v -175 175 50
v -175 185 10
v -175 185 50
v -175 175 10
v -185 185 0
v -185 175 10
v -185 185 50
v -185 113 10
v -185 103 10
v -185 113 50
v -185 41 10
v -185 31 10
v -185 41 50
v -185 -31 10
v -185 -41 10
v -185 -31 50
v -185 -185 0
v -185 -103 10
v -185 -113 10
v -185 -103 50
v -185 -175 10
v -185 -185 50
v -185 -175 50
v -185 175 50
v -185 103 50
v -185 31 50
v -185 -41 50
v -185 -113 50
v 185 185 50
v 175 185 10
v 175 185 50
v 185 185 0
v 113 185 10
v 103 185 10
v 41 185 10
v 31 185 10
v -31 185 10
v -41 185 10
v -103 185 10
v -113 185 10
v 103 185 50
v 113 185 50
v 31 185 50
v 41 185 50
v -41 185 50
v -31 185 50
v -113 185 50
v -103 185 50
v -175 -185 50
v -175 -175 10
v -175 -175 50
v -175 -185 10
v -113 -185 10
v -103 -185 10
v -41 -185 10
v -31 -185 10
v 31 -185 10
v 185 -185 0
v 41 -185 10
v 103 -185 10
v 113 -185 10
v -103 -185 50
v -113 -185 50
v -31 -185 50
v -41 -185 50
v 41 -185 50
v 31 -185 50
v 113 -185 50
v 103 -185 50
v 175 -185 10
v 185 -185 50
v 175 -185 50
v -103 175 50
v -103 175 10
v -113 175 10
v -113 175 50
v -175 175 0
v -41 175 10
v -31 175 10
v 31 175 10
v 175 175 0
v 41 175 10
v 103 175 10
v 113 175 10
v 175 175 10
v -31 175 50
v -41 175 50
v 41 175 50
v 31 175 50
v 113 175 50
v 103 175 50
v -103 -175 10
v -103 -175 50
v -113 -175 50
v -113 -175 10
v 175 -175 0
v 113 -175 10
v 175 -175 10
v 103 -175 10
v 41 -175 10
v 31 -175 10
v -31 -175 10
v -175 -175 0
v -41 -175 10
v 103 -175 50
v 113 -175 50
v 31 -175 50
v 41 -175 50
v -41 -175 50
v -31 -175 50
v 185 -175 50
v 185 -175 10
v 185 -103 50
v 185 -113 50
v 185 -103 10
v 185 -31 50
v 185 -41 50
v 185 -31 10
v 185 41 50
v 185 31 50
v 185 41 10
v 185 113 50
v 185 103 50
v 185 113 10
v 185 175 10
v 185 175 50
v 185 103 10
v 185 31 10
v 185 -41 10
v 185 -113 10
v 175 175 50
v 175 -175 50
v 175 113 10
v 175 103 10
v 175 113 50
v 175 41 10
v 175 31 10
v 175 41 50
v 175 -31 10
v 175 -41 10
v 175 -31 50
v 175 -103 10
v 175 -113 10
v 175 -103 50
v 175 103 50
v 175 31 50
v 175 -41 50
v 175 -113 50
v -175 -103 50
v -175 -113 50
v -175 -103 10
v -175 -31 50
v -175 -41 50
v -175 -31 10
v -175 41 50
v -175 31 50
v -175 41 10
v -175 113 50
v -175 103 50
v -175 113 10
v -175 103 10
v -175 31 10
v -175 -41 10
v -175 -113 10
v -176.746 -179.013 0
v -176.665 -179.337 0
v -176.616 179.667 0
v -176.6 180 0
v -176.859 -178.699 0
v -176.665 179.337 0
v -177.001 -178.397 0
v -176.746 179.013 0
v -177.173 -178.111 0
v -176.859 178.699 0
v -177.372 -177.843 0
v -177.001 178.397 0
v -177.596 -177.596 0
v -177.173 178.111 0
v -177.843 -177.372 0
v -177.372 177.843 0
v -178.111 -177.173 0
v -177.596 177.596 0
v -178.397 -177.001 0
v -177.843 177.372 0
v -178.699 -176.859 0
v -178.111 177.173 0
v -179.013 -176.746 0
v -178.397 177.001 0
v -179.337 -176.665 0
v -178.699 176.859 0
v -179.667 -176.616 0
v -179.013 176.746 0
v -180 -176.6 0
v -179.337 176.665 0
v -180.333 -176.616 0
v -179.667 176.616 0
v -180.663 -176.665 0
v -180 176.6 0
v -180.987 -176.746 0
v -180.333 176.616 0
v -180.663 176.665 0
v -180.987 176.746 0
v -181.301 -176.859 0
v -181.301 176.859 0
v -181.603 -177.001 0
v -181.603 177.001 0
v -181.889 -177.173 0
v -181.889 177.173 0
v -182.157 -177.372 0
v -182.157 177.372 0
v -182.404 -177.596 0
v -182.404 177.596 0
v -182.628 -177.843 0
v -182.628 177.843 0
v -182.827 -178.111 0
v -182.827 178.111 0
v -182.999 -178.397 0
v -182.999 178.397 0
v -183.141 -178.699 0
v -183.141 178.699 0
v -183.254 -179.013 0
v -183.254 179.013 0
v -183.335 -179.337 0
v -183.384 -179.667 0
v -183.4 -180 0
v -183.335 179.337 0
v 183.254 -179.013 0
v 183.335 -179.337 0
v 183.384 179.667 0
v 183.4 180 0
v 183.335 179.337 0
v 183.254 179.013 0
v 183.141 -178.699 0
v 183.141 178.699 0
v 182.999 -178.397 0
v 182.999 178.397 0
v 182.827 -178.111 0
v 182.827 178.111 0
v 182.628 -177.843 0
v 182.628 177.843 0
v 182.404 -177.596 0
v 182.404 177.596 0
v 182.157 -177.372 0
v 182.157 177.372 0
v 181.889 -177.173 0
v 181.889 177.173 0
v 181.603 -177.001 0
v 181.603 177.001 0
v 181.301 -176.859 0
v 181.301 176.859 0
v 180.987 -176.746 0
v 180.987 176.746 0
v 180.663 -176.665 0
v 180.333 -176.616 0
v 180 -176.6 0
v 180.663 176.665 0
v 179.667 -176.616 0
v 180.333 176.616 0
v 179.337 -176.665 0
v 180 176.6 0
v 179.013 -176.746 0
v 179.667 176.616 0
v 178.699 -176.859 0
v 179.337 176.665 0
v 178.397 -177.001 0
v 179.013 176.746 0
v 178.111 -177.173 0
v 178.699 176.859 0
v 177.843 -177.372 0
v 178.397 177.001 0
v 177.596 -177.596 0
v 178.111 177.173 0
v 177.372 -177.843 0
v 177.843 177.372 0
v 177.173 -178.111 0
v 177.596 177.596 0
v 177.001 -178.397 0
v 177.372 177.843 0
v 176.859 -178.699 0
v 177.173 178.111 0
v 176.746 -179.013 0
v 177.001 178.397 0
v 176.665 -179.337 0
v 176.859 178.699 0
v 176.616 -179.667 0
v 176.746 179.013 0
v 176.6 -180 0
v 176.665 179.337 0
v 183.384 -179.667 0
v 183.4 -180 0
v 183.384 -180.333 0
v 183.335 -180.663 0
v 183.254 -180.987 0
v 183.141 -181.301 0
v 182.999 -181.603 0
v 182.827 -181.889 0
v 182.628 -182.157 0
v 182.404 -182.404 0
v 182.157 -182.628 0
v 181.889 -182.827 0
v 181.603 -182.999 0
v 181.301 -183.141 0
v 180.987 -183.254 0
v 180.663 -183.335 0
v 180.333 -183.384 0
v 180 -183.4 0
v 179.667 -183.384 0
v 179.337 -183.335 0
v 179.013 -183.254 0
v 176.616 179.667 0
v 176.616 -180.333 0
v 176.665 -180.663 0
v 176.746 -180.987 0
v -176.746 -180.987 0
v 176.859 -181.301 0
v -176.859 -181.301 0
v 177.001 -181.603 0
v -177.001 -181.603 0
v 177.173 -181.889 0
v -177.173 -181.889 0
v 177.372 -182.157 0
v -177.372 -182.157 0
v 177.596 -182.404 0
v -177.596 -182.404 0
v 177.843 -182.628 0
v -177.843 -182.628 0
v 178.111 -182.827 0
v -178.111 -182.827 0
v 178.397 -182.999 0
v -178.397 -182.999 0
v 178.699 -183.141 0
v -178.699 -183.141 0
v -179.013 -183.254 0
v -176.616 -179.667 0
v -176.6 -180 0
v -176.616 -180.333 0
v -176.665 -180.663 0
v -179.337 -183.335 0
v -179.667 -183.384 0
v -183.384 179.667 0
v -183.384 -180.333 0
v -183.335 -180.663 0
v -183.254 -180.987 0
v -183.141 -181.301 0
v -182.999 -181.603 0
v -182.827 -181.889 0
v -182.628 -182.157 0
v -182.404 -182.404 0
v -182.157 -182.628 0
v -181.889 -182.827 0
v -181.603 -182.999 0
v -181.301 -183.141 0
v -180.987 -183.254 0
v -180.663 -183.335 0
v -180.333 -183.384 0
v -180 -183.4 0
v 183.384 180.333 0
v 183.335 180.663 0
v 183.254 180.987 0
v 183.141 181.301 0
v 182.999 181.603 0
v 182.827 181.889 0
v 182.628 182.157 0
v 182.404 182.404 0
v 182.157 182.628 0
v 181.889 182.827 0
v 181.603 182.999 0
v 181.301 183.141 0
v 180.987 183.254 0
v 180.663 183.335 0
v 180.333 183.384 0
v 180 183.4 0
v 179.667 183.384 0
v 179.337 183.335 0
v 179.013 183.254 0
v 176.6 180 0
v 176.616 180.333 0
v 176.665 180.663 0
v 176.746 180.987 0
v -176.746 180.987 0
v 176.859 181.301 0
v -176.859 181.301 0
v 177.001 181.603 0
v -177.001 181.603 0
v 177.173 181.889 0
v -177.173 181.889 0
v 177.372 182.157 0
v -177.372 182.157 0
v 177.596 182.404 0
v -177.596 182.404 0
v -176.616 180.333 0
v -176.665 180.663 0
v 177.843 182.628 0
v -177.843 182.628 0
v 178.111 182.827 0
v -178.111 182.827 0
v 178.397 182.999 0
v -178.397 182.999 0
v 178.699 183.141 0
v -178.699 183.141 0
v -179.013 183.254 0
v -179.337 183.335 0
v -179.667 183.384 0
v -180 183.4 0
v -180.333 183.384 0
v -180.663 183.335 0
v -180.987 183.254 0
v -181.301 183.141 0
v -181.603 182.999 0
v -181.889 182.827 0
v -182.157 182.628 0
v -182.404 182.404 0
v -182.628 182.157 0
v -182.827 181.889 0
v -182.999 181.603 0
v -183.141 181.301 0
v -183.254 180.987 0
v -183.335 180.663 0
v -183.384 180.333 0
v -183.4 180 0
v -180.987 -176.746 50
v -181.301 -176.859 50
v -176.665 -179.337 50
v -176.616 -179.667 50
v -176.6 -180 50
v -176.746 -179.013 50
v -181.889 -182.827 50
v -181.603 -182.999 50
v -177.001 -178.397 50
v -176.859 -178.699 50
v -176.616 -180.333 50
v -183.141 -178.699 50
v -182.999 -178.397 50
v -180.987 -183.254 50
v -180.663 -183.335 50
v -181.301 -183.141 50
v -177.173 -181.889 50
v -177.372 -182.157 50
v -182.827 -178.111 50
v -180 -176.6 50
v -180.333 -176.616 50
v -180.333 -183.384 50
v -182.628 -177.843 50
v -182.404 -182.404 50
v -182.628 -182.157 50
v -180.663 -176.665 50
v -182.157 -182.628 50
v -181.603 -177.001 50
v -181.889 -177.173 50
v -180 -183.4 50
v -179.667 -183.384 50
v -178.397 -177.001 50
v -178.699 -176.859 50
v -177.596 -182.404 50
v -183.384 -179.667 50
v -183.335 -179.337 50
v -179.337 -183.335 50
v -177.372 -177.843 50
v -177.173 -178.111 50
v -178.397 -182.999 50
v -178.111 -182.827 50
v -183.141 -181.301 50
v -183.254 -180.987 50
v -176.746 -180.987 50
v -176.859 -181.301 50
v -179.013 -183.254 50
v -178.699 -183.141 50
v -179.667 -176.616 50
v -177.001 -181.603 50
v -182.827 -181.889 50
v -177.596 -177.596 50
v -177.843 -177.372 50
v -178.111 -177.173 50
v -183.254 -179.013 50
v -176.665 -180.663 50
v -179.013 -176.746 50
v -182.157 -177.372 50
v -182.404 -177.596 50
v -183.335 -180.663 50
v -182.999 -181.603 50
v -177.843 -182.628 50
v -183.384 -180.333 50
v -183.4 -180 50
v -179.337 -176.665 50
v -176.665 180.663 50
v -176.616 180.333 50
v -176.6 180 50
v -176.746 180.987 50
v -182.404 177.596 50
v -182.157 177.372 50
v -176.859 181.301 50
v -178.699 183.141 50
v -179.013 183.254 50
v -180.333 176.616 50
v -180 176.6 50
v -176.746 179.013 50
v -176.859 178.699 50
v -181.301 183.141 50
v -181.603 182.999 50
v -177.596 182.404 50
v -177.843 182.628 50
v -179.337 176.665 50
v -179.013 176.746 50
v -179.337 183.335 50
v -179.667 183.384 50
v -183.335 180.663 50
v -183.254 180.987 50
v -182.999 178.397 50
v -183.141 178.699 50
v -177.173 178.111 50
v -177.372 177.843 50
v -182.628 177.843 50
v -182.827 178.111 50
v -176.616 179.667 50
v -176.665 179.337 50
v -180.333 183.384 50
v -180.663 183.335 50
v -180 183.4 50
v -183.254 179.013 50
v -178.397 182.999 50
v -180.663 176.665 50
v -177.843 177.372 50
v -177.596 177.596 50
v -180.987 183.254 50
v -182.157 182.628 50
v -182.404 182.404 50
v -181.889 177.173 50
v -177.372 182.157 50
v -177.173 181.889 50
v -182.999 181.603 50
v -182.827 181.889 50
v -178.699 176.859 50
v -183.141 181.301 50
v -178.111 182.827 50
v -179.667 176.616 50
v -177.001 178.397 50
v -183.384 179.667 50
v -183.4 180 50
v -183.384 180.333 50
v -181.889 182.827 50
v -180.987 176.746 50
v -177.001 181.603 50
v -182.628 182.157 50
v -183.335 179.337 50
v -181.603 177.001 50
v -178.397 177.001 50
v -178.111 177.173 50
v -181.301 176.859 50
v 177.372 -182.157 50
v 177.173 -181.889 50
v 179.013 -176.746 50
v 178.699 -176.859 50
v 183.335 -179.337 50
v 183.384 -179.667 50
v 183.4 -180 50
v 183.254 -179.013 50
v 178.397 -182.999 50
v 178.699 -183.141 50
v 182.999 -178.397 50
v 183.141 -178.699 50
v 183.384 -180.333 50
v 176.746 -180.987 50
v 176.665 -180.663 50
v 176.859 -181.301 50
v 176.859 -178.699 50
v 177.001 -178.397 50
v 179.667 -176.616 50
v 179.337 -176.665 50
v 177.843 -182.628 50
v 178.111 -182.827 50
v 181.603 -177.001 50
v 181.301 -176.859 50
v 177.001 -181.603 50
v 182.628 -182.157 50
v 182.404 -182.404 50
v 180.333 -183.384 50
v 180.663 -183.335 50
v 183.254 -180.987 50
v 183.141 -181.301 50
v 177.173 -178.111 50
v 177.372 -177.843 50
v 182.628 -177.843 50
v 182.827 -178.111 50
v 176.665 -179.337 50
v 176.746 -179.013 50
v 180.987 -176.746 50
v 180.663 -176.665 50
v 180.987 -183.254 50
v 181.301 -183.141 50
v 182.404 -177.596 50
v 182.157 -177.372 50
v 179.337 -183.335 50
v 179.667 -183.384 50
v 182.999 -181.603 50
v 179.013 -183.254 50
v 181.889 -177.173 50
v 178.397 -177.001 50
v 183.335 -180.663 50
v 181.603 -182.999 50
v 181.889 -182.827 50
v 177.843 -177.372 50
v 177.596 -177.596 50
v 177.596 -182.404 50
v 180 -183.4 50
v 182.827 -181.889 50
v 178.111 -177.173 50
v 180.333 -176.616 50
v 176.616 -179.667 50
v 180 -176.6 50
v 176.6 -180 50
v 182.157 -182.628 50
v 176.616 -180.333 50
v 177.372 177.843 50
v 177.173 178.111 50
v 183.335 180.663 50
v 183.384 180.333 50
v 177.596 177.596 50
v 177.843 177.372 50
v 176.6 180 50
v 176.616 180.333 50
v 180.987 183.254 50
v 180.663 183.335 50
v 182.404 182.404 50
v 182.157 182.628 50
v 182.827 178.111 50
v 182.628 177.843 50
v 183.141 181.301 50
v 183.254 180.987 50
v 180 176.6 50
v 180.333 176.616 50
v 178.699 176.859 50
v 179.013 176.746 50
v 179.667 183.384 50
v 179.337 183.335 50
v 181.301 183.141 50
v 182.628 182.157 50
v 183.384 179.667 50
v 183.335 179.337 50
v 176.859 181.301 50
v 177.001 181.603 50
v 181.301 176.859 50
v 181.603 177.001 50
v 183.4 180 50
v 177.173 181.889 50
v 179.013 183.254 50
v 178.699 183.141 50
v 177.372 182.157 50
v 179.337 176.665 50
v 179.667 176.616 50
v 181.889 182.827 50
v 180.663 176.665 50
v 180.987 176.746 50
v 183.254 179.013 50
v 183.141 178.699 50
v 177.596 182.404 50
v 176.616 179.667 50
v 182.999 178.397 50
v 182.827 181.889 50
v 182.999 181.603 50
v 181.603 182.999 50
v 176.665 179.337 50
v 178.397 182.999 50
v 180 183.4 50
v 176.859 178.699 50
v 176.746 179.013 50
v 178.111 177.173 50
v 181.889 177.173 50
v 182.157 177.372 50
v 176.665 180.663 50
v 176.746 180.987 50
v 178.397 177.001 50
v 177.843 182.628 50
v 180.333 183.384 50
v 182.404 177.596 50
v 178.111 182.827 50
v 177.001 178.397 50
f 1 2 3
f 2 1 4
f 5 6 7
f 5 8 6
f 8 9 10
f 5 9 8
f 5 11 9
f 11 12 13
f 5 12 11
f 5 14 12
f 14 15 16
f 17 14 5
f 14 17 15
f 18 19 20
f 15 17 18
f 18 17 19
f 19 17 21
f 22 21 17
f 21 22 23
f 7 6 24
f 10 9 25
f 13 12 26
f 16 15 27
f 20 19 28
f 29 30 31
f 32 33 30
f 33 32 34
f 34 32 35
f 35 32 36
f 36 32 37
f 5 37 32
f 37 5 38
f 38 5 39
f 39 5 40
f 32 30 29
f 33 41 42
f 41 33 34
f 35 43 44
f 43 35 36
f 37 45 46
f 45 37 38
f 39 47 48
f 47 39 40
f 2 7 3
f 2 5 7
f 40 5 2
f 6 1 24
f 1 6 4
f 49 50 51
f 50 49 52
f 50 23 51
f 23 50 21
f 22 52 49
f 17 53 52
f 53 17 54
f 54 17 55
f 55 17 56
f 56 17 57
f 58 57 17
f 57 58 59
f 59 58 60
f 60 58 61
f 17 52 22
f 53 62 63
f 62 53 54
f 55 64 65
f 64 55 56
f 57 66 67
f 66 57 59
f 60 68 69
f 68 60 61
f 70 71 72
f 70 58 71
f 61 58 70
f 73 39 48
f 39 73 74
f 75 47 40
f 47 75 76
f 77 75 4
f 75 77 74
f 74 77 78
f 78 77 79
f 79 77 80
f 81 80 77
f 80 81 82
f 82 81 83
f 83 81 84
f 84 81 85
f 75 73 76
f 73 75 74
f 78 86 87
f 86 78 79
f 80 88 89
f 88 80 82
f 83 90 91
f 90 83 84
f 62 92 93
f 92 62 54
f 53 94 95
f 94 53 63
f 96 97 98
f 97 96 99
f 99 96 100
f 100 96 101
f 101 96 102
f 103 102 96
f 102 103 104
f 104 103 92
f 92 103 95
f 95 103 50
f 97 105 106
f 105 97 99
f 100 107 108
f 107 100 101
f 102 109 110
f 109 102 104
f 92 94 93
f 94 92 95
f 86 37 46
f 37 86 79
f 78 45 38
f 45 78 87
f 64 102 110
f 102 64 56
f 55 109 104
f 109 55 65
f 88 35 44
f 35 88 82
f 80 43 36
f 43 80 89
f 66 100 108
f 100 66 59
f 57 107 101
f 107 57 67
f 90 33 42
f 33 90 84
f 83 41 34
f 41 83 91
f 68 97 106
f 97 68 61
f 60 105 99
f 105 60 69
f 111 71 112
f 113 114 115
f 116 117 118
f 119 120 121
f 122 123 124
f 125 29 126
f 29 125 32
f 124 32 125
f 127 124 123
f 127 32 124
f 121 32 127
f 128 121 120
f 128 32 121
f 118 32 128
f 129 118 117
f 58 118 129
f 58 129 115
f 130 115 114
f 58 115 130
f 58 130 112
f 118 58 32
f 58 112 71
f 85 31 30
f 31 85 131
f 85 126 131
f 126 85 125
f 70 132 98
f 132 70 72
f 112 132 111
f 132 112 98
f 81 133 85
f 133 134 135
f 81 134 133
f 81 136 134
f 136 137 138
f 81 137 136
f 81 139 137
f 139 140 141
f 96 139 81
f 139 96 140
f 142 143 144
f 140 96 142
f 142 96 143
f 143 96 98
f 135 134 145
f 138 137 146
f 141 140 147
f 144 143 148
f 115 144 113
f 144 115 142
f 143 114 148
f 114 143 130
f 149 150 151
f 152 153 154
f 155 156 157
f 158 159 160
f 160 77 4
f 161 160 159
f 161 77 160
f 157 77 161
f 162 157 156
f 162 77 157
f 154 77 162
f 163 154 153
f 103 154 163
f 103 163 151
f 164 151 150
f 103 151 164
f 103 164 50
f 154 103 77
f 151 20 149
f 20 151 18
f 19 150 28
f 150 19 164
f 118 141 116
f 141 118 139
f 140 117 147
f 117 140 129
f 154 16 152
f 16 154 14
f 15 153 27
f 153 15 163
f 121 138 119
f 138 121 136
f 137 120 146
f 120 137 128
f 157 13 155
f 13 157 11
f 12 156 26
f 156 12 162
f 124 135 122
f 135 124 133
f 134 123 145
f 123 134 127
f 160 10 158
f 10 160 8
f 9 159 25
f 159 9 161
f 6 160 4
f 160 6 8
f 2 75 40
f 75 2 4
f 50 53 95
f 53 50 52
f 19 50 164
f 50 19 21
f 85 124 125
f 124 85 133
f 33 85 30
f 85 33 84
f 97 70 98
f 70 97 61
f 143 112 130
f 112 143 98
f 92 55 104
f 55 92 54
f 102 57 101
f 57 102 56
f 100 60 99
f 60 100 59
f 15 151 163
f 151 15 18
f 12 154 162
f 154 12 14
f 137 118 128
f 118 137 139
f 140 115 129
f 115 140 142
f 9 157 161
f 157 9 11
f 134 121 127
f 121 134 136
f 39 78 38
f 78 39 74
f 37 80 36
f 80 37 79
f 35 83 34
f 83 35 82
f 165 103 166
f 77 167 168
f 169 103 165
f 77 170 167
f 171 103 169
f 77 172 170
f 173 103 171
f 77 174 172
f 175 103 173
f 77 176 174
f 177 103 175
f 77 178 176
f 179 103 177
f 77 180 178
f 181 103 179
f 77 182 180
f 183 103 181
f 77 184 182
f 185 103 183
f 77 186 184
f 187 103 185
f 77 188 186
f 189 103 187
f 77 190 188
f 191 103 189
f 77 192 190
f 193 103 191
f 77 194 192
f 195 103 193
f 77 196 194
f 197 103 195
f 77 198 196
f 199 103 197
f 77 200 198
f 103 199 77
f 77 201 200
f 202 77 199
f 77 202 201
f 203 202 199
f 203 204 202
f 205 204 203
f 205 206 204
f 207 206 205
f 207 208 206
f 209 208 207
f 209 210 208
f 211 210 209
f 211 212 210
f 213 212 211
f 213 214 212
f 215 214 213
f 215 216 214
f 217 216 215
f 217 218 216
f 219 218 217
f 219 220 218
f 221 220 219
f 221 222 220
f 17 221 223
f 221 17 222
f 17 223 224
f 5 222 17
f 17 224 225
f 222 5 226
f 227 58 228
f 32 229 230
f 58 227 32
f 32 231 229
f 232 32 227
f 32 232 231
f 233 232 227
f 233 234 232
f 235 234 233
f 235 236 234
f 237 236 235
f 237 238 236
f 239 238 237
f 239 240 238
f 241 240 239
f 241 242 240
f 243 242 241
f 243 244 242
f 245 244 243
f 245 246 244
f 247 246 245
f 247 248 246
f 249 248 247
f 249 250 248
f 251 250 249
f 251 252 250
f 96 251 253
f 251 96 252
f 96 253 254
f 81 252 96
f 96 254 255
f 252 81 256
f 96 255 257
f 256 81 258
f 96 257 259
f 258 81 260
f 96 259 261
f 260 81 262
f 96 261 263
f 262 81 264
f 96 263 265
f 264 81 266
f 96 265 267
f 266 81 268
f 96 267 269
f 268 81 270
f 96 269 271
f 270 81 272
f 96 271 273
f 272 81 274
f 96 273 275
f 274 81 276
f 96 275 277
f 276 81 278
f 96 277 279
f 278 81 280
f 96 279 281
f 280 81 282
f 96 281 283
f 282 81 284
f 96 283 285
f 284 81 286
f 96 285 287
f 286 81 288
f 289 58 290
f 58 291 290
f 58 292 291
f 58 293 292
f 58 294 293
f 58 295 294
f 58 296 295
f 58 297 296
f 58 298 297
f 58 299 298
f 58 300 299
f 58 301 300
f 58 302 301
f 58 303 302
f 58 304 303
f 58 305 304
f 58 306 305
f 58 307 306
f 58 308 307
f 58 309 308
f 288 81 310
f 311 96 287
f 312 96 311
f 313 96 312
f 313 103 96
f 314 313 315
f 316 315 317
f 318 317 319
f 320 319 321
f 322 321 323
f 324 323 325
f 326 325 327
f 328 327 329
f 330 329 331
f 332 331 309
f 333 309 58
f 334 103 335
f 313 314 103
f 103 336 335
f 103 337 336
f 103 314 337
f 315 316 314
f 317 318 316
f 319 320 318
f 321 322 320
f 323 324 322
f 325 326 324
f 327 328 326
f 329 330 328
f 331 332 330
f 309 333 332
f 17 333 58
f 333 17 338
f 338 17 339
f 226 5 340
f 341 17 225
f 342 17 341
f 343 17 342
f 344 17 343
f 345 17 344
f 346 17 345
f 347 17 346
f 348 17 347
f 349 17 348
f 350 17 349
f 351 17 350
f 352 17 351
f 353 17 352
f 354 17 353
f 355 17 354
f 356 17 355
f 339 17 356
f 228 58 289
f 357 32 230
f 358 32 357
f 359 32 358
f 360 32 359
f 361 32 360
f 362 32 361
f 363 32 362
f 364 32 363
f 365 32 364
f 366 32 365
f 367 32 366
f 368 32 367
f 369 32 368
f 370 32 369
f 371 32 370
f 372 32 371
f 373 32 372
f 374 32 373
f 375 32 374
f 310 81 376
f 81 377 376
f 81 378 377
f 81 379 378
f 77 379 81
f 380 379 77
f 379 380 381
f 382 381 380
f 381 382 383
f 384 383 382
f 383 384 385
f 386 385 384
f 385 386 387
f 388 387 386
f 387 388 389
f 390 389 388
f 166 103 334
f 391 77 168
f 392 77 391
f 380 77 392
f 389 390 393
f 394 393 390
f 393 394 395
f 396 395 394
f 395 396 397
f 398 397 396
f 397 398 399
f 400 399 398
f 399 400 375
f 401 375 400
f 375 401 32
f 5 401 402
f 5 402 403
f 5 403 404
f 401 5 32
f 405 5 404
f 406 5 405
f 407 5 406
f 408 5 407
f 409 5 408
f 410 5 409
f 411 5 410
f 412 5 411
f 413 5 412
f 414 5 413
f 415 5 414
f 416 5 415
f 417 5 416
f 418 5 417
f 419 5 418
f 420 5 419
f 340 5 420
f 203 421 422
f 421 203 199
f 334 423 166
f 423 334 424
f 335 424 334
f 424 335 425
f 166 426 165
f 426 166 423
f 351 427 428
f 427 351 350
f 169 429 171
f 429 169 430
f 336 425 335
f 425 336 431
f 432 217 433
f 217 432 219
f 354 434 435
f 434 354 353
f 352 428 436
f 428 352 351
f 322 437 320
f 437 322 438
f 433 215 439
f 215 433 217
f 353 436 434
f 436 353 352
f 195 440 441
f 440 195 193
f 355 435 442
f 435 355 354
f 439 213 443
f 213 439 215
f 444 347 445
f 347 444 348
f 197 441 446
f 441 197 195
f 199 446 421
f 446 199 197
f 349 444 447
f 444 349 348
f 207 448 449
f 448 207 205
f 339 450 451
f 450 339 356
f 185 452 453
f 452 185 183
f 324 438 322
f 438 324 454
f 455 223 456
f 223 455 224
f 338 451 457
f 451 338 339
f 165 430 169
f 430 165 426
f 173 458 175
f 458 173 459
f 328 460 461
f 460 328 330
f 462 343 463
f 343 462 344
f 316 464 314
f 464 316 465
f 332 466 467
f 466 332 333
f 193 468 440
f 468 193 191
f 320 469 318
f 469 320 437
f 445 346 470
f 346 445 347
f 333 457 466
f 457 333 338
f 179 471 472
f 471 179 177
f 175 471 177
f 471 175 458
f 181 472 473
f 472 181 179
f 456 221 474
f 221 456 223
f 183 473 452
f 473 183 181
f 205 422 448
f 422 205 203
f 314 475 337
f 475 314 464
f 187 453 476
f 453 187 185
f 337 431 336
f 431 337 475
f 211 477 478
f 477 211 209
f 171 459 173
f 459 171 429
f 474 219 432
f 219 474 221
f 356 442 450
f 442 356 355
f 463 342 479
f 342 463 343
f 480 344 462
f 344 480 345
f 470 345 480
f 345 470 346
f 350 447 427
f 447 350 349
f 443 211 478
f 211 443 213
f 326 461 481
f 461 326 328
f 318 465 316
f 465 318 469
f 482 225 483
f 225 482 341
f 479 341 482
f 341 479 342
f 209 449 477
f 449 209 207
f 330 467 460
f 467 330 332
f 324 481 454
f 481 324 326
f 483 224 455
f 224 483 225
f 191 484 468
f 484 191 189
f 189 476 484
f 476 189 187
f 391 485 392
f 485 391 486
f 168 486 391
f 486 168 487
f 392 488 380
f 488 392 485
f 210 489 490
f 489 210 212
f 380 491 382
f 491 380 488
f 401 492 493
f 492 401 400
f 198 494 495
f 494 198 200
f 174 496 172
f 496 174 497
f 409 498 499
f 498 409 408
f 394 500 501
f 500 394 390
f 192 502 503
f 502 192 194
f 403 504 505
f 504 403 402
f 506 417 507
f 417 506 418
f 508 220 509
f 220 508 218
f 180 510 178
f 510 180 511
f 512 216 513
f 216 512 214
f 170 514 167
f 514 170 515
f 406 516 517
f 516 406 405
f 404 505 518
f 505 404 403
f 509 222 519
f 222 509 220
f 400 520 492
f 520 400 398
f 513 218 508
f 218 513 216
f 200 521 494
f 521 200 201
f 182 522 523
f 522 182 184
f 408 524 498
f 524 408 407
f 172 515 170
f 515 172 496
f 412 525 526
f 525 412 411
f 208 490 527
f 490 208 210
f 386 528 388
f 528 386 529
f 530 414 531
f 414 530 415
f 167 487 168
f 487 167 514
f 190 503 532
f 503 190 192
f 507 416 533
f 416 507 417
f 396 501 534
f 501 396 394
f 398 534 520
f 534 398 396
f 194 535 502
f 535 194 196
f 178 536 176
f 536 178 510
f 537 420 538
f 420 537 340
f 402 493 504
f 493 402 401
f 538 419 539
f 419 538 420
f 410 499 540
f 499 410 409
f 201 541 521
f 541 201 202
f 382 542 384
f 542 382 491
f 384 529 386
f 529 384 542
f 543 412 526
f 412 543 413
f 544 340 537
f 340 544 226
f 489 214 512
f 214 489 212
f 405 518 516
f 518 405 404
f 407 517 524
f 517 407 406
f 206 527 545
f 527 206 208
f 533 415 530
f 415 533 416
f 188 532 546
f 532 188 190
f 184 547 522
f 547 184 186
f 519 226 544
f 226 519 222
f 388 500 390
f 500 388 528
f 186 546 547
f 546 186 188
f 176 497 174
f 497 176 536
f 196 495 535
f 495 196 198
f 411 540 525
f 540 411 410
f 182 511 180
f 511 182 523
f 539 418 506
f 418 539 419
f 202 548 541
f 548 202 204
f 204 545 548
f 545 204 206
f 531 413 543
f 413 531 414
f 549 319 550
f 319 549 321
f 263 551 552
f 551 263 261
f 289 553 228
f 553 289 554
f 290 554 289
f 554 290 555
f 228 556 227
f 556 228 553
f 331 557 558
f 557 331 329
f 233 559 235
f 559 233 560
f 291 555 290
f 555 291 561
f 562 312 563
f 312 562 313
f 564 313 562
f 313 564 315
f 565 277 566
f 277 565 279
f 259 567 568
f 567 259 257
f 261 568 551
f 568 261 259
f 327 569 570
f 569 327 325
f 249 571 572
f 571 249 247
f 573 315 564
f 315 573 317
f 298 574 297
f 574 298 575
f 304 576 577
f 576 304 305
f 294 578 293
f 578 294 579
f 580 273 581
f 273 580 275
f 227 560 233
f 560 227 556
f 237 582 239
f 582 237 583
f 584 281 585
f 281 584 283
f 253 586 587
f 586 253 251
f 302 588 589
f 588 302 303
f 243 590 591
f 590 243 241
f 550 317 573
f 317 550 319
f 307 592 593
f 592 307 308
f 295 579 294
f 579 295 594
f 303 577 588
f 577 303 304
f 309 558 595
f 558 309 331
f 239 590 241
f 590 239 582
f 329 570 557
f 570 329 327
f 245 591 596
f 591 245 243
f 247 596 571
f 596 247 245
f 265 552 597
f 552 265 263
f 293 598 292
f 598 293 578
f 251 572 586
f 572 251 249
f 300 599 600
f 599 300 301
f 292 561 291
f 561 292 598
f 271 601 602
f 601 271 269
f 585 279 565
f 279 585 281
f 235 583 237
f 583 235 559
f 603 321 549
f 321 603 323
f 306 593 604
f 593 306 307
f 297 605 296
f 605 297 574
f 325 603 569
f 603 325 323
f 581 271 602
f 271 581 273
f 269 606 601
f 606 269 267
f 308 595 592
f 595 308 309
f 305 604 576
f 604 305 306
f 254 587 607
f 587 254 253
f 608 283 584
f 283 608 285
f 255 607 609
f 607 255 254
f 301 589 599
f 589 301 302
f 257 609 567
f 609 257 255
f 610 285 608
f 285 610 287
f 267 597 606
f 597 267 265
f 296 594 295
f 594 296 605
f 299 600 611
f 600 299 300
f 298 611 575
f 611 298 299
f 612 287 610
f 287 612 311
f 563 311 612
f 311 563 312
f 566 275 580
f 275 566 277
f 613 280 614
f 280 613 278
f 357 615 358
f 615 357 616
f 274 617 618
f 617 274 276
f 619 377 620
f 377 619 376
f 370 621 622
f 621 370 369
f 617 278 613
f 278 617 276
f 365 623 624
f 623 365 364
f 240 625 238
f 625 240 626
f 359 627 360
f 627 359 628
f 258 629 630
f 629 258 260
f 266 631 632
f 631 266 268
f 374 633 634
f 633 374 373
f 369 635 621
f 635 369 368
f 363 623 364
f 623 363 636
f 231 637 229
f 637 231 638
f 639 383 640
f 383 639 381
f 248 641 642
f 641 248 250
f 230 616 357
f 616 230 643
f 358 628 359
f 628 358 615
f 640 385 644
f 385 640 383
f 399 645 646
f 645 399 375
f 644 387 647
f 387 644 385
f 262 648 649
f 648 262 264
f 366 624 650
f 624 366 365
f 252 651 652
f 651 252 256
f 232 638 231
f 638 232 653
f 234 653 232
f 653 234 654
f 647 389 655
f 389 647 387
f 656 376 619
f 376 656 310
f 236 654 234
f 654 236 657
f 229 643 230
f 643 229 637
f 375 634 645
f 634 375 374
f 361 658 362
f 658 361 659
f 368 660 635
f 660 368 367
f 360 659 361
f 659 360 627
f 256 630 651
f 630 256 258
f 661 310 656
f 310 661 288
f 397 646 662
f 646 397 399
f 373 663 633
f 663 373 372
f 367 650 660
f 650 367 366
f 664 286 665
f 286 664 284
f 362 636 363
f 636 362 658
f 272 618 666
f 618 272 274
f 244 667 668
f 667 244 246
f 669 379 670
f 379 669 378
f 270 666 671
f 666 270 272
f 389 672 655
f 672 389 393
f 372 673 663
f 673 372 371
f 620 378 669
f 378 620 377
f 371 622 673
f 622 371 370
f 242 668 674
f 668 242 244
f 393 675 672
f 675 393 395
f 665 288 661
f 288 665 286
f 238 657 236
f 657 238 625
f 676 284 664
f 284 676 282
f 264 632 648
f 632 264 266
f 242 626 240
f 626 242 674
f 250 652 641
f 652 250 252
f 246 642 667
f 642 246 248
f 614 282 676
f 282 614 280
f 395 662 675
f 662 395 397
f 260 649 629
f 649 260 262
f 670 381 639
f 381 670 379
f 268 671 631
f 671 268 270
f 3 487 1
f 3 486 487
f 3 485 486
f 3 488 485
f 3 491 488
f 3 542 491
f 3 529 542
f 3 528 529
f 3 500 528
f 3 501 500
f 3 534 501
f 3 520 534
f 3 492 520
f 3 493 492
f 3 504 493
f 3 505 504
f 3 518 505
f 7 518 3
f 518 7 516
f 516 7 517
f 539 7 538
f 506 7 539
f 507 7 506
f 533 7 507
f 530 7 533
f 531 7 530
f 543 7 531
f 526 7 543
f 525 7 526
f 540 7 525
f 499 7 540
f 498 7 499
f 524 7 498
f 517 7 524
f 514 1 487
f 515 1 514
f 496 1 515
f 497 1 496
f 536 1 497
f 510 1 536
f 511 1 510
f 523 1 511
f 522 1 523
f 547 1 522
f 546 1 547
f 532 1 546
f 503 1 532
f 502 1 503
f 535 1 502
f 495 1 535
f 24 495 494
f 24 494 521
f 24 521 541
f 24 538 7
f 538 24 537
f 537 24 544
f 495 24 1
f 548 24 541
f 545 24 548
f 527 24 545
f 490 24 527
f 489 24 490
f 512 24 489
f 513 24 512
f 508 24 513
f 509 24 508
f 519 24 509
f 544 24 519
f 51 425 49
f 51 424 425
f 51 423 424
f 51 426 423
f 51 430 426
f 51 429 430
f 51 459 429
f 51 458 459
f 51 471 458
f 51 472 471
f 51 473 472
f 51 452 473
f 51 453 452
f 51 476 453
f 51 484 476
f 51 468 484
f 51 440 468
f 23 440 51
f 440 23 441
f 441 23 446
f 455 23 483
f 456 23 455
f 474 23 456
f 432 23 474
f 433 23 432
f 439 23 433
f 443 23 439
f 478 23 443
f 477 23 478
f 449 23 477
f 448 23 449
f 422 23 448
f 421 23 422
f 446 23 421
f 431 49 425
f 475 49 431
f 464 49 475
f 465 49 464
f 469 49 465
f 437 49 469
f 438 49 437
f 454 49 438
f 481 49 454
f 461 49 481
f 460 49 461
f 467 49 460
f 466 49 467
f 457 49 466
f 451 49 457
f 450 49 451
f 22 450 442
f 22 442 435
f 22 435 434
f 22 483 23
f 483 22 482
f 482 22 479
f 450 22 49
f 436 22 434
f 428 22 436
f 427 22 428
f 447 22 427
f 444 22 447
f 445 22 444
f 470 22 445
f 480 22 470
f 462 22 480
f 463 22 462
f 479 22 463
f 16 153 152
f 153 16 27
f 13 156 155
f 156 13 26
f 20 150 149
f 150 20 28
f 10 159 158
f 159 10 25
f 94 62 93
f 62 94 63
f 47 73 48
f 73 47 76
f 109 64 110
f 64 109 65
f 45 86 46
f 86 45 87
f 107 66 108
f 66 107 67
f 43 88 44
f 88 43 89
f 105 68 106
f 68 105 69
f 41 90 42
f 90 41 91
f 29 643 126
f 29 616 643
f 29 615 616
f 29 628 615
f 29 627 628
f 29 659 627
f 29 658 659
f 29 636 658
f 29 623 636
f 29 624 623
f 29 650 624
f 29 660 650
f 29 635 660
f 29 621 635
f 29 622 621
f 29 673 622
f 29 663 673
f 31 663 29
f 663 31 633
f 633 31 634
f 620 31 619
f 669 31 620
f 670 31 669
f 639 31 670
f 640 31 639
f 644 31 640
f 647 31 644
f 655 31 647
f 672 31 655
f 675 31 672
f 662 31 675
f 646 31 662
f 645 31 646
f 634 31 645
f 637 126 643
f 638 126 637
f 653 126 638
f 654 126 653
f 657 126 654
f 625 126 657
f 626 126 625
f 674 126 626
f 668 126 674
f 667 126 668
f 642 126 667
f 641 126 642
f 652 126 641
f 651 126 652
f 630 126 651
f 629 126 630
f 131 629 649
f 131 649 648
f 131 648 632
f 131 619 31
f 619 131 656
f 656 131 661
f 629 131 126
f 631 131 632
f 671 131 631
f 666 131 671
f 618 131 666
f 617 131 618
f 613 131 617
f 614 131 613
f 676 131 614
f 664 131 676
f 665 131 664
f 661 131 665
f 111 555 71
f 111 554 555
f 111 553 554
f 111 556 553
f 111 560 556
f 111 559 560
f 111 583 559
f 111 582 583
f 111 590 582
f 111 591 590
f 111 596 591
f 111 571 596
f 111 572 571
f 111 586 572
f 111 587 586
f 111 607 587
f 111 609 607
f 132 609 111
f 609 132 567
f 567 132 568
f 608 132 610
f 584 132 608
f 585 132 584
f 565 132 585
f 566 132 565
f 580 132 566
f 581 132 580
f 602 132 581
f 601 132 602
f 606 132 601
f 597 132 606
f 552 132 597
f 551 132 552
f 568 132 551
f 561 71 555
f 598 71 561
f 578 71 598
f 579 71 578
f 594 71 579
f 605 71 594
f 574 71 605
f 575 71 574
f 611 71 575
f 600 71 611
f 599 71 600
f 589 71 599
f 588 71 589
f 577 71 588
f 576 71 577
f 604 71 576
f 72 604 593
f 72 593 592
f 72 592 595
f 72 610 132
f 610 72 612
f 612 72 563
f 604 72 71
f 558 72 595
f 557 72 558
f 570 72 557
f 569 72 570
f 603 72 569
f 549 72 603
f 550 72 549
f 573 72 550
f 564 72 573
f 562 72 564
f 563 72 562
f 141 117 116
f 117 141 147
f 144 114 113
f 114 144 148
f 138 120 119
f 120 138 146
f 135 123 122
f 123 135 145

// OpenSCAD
// Cage slice part (z0..z1). Units: mm.
// Print orientation: normal

bar=10;
inner=[350,350,700];
gap_xy=62;
gap_z=61;
hole_d=6.8;
$fn=64;

outer=[inner[0]+2*bar, inner[1]+2*bar, inner[2]+2*bar];
half=[outer[0]/2, outer[1]/2, outer[2]/2];

pitch_xy=bar+gap_xy;
pitch_z=bar+gap_z;

centers=[for(i=[0:5]) -(half[0]-bar/2) + i*pitch_xy];
z_levels=[for(i=[0:10]) i*pitch_z];

module vbar(xc,yc){ translate([xc-bar/2,yc-bar/2,0]) cube([bar,bar,outer[2]],center=false); }
module hbar_x(yc,z0){ translate([-half[0],yc-bar/2,z0]) cube([outer[0],bar,bar],center=false); }
module hbar_y(xc,z0){ translate([xc-bar/2,-half[1],z0]) cube([bar,outer[1],bar],center=false); }

module grid(z0){ union(){ for(yc=centers) hbar_x(yc,z0); for(xc=centers) hbar_y(xc,z0); } }

module side_verticals(){
  union(){
    for(xc=centers){ vbar(xc, half[1]-bar/2); vbar(xc,-half[1]+bar/2); }
    for(yc=centers){ vbar( half[0]-bar/2,yc); vbar(-half[0]+bar/2,yc); }
  }
}

module side_rings(){
  union(){
    for(z0=z_levels){
      hbar_x( half[1]-bar/2,z0); hbar_x(-half[1]+bar/2,z0);
      hbar_y( half[0]-bar/2,z0); hbar_y(-half[0]+bar/2,z0);
    }
  }
}

module rod_holes(){
  for(sx=[-1,1],sy=[-1,1]) translate([sx*(half[0]-bar/2), sy*(half[1]-bar/2), -1]) cylinder(d=hole_d,h=outer[2]+2,center=false);
}

module cage(){ difference(){ union(){ side_verticals(); side_rings(); grid(0); grid(outer[2]-bar); } rod_holes(); } }

module cage_slice(zmin,zmax){ intersection(){ cage(); translate([-1000,-1000,zmin]) cube([2000,2000,zmax-zmin],center=false); } }

z0=497; z1=547;
translate([0,0,-z0]) cage_slice(z0,z1);
